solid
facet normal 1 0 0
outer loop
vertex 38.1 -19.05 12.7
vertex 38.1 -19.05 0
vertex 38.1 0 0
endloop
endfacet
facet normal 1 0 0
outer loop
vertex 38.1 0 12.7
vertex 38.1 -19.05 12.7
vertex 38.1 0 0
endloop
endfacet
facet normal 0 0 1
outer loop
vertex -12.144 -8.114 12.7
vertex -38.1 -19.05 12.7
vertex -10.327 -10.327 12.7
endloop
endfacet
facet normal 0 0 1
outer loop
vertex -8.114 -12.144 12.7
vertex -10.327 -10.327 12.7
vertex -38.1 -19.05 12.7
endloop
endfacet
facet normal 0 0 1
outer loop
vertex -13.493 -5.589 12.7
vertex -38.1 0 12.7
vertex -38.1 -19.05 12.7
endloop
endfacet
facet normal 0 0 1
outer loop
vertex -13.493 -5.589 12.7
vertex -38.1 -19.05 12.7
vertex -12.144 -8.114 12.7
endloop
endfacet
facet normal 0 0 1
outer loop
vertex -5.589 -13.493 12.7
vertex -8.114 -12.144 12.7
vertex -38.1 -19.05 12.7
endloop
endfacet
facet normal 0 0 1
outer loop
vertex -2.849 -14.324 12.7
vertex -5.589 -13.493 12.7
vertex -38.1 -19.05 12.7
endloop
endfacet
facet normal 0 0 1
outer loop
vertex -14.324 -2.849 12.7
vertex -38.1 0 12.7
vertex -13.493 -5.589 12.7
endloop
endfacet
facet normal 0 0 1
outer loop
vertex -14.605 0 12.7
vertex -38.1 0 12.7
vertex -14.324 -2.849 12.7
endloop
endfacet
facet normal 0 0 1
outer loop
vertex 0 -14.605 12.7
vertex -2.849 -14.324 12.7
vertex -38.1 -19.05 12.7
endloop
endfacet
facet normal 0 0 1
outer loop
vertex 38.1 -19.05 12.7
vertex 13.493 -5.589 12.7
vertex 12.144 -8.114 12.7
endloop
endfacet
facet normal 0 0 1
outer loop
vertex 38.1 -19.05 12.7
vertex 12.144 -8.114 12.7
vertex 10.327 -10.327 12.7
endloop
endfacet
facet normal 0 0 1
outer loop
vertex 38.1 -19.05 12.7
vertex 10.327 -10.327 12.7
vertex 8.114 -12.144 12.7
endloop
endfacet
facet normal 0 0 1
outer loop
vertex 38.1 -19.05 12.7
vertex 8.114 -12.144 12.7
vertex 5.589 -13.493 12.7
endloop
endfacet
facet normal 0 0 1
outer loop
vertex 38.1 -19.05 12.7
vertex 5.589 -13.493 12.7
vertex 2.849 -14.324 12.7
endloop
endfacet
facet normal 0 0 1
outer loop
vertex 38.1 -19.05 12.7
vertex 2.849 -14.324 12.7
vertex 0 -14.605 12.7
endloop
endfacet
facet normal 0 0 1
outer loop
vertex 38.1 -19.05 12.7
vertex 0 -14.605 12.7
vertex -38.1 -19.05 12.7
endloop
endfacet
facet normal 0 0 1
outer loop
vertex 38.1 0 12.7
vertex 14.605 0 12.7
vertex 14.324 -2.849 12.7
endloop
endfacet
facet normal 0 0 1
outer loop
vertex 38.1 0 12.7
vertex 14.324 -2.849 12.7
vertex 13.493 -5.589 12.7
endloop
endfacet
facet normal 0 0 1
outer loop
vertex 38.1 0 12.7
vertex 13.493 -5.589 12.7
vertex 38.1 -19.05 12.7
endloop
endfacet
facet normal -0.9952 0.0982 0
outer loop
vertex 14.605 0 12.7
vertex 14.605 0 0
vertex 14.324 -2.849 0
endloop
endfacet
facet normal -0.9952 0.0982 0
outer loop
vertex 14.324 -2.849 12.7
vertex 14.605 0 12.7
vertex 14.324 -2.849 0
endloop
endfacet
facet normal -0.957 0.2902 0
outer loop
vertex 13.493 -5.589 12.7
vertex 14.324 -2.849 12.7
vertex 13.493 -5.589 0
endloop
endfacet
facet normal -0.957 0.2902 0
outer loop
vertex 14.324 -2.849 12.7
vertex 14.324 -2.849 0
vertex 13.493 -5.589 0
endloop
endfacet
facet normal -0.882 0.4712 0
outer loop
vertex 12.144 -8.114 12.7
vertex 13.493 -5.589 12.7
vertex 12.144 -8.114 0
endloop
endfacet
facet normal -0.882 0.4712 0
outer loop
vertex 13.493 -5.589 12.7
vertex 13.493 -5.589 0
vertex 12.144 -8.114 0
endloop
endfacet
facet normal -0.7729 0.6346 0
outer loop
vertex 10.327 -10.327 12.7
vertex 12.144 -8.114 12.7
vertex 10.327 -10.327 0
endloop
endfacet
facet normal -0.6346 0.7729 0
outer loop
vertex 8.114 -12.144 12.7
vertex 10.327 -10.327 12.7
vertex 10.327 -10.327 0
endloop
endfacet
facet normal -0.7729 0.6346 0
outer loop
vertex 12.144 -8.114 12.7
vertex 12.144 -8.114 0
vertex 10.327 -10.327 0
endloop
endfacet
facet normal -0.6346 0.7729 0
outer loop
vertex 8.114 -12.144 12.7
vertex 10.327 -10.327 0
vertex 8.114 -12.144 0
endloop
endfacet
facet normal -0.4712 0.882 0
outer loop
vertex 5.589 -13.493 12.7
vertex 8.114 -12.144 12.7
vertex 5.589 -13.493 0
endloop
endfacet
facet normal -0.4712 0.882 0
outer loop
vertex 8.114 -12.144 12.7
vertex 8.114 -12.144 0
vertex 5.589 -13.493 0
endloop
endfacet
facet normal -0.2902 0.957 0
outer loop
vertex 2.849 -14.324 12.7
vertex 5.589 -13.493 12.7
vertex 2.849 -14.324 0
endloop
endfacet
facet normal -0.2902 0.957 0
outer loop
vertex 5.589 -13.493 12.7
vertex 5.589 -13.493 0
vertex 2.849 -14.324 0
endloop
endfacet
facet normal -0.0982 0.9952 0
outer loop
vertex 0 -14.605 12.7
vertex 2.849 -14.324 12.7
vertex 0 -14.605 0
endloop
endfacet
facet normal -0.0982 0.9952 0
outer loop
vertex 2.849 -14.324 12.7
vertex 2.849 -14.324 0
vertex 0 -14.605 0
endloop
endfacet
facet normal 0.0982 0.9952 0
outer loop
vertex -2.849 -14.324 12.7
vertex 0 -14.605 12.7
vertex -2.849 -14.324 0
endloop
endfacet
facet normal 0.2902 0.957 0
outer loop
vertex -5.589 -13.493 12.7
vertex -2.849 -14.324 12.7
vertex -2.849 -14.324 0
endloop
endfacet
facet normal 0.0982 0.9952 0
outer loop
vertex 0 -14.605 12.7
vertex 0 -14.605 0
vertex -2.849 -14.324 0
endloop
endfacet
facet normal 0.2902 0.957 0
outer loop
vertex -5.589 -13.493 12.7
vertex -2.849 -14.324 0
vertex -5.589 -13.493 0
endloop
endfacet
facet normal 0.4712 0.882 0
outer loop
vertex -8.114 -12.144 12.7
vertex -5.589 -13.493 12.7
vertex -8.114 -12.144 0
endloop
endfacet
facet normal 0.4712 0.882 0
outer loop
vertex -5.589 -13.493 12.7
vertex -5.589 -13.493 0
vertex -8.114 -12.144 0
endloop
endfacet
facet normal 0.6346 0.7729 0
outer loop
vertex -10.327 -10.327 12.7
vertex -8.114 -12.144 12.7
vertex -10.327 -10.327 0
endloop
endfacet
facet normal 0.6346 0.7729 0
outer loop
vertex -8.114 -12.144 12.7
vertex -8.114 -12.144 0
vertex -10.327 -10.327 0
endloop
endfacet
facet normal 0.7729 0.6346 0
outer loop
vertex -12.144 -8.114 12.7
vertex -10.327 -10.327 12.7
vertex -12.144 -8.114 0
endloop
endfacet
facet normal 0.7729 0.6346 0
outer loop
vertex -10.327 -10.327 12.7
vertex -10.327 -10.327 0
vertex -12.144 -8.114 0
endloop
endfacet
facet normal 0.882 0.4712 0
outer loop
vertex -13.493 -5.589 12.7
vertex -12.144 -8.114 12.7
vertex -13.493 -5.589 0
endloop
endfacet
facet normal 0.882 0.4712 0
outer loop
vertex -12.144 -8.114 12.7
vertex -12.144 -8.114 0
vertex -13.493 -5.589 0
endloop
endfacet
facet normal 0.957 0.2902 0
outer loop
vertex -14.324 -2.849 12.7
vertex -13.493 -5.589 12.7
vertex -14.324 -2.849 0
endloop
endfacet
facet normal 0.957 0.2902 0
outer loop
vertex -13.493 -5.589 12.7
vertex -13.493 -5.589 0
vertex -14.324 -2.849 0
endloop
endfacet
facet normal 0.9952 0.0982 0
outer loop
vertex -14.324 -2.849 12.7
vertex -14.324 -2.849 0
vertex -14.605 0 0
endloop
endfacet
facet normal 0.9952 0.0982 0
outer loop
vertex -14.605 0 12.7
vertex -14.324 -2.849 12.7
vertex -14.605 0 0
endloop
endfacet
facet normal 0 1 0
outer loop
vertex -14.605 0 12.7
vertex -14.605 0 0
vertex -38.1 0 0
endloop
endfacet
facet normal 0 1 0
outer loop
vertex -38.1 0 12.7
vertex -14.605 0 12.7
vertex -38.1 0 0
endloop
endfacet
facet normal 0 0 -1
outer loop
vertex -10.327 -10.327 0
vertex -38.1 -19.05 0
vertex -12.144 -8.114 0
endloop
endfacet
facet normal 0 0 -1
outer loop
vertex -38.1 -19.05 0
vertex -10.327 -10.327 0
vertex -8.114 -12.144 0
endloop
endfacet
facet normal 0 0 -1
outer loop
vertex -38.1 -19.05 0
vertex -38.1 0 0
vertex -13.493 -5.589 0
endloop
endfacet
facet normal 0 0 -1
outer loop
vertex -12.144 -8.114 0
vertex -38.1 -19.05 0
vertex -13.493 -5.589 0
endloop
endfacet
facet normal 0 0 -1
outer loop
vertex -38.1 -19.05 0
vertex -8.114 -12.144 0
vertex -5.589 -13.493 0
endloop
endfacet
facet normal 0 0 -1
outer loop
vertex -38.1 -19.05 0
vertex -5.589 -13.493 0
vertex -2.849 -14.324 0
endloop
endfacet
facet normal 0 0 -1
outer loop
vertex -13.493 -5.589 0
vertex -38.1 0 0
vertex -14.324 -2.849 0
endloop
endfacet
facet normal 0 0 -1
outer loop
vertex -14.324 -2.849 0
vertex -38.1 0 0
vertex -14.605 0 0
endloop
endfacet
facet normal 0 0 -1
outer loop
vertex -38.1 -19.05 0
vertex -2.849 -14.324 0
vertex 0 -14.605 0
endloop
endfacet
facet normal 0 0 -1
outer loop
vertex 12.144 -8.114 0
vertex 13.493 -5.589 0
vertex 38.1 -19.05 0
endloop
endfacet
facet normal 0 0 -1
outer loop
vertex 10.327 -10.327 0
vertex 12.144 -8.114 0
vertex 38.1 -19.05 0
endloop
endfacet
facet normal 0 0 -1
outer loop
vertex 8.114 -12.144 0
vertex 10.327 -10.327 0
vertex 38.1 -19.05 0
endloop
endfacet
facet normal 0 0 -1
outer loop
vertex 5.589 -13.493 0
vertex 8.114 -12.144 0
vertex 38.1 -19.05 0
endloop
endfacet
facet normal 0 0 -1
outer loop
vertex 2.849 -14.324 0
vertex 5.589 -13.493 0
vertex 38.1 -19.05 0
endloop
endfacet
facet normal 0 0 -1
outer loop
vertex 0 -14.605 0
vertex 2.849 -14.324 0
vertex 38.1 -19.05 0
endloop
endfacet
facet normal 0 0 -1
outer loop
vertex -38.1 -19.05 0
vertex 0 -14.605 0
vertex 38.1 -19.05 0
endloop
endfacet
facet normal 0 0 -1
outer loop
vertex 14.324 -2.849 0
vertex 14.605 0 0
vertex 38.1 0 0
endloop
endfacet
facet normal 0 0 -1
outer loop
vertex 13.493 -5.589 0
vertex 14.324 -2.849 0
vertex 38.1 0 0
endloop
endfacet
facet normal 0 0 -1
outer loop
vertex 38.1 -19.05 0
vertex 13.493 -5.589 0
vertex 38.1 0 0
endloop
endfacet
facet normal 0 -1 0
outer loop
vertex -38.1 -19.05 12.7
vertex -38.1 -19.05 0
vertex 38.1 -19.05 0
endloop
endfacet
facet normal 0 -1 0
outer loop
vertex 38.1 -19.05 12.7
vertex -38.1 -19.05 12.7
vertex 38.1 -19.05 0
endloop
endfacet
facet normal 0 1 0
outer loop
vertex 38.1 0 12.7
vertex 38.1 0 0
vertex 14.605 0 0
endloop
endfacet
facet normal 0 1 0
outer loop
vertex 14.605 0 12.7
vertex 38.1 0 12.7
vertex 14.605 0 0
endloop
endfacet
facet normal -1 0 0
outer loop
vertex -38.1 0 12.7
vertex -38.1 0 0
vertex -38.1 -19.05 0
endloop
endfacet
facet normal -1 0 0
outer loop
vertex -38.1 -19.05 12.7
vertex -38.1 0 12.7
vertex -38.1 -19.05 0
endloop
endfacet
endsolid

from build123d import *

# Parameters (mm, degrees)
BOSS_EXTRUDE1_DEPTH = 12.7


with BuildPart() as part:
    # Sketch1 → Boss-Extrude1 (new body)
    with BuildSketch(Plane.XY):
        with BuildLine():
            Line((-38.1, -19.05), (38.1, -19.05))
            Line((38.1, -19.05), (38.1, 0))
            Line((38.1, 0), (14.605, 0))
            ThreePointArc((14.605, 0), (0, -14.605), (-14.605, 0))
            Line((-14.605, 0), (-38.1, 0))
            Line((-38.1, 0), (-38.1, -19.05))
        make_face()
    extrude(amount=BOSS_EXTRUDE1_DEPTH)


solid = part.part
